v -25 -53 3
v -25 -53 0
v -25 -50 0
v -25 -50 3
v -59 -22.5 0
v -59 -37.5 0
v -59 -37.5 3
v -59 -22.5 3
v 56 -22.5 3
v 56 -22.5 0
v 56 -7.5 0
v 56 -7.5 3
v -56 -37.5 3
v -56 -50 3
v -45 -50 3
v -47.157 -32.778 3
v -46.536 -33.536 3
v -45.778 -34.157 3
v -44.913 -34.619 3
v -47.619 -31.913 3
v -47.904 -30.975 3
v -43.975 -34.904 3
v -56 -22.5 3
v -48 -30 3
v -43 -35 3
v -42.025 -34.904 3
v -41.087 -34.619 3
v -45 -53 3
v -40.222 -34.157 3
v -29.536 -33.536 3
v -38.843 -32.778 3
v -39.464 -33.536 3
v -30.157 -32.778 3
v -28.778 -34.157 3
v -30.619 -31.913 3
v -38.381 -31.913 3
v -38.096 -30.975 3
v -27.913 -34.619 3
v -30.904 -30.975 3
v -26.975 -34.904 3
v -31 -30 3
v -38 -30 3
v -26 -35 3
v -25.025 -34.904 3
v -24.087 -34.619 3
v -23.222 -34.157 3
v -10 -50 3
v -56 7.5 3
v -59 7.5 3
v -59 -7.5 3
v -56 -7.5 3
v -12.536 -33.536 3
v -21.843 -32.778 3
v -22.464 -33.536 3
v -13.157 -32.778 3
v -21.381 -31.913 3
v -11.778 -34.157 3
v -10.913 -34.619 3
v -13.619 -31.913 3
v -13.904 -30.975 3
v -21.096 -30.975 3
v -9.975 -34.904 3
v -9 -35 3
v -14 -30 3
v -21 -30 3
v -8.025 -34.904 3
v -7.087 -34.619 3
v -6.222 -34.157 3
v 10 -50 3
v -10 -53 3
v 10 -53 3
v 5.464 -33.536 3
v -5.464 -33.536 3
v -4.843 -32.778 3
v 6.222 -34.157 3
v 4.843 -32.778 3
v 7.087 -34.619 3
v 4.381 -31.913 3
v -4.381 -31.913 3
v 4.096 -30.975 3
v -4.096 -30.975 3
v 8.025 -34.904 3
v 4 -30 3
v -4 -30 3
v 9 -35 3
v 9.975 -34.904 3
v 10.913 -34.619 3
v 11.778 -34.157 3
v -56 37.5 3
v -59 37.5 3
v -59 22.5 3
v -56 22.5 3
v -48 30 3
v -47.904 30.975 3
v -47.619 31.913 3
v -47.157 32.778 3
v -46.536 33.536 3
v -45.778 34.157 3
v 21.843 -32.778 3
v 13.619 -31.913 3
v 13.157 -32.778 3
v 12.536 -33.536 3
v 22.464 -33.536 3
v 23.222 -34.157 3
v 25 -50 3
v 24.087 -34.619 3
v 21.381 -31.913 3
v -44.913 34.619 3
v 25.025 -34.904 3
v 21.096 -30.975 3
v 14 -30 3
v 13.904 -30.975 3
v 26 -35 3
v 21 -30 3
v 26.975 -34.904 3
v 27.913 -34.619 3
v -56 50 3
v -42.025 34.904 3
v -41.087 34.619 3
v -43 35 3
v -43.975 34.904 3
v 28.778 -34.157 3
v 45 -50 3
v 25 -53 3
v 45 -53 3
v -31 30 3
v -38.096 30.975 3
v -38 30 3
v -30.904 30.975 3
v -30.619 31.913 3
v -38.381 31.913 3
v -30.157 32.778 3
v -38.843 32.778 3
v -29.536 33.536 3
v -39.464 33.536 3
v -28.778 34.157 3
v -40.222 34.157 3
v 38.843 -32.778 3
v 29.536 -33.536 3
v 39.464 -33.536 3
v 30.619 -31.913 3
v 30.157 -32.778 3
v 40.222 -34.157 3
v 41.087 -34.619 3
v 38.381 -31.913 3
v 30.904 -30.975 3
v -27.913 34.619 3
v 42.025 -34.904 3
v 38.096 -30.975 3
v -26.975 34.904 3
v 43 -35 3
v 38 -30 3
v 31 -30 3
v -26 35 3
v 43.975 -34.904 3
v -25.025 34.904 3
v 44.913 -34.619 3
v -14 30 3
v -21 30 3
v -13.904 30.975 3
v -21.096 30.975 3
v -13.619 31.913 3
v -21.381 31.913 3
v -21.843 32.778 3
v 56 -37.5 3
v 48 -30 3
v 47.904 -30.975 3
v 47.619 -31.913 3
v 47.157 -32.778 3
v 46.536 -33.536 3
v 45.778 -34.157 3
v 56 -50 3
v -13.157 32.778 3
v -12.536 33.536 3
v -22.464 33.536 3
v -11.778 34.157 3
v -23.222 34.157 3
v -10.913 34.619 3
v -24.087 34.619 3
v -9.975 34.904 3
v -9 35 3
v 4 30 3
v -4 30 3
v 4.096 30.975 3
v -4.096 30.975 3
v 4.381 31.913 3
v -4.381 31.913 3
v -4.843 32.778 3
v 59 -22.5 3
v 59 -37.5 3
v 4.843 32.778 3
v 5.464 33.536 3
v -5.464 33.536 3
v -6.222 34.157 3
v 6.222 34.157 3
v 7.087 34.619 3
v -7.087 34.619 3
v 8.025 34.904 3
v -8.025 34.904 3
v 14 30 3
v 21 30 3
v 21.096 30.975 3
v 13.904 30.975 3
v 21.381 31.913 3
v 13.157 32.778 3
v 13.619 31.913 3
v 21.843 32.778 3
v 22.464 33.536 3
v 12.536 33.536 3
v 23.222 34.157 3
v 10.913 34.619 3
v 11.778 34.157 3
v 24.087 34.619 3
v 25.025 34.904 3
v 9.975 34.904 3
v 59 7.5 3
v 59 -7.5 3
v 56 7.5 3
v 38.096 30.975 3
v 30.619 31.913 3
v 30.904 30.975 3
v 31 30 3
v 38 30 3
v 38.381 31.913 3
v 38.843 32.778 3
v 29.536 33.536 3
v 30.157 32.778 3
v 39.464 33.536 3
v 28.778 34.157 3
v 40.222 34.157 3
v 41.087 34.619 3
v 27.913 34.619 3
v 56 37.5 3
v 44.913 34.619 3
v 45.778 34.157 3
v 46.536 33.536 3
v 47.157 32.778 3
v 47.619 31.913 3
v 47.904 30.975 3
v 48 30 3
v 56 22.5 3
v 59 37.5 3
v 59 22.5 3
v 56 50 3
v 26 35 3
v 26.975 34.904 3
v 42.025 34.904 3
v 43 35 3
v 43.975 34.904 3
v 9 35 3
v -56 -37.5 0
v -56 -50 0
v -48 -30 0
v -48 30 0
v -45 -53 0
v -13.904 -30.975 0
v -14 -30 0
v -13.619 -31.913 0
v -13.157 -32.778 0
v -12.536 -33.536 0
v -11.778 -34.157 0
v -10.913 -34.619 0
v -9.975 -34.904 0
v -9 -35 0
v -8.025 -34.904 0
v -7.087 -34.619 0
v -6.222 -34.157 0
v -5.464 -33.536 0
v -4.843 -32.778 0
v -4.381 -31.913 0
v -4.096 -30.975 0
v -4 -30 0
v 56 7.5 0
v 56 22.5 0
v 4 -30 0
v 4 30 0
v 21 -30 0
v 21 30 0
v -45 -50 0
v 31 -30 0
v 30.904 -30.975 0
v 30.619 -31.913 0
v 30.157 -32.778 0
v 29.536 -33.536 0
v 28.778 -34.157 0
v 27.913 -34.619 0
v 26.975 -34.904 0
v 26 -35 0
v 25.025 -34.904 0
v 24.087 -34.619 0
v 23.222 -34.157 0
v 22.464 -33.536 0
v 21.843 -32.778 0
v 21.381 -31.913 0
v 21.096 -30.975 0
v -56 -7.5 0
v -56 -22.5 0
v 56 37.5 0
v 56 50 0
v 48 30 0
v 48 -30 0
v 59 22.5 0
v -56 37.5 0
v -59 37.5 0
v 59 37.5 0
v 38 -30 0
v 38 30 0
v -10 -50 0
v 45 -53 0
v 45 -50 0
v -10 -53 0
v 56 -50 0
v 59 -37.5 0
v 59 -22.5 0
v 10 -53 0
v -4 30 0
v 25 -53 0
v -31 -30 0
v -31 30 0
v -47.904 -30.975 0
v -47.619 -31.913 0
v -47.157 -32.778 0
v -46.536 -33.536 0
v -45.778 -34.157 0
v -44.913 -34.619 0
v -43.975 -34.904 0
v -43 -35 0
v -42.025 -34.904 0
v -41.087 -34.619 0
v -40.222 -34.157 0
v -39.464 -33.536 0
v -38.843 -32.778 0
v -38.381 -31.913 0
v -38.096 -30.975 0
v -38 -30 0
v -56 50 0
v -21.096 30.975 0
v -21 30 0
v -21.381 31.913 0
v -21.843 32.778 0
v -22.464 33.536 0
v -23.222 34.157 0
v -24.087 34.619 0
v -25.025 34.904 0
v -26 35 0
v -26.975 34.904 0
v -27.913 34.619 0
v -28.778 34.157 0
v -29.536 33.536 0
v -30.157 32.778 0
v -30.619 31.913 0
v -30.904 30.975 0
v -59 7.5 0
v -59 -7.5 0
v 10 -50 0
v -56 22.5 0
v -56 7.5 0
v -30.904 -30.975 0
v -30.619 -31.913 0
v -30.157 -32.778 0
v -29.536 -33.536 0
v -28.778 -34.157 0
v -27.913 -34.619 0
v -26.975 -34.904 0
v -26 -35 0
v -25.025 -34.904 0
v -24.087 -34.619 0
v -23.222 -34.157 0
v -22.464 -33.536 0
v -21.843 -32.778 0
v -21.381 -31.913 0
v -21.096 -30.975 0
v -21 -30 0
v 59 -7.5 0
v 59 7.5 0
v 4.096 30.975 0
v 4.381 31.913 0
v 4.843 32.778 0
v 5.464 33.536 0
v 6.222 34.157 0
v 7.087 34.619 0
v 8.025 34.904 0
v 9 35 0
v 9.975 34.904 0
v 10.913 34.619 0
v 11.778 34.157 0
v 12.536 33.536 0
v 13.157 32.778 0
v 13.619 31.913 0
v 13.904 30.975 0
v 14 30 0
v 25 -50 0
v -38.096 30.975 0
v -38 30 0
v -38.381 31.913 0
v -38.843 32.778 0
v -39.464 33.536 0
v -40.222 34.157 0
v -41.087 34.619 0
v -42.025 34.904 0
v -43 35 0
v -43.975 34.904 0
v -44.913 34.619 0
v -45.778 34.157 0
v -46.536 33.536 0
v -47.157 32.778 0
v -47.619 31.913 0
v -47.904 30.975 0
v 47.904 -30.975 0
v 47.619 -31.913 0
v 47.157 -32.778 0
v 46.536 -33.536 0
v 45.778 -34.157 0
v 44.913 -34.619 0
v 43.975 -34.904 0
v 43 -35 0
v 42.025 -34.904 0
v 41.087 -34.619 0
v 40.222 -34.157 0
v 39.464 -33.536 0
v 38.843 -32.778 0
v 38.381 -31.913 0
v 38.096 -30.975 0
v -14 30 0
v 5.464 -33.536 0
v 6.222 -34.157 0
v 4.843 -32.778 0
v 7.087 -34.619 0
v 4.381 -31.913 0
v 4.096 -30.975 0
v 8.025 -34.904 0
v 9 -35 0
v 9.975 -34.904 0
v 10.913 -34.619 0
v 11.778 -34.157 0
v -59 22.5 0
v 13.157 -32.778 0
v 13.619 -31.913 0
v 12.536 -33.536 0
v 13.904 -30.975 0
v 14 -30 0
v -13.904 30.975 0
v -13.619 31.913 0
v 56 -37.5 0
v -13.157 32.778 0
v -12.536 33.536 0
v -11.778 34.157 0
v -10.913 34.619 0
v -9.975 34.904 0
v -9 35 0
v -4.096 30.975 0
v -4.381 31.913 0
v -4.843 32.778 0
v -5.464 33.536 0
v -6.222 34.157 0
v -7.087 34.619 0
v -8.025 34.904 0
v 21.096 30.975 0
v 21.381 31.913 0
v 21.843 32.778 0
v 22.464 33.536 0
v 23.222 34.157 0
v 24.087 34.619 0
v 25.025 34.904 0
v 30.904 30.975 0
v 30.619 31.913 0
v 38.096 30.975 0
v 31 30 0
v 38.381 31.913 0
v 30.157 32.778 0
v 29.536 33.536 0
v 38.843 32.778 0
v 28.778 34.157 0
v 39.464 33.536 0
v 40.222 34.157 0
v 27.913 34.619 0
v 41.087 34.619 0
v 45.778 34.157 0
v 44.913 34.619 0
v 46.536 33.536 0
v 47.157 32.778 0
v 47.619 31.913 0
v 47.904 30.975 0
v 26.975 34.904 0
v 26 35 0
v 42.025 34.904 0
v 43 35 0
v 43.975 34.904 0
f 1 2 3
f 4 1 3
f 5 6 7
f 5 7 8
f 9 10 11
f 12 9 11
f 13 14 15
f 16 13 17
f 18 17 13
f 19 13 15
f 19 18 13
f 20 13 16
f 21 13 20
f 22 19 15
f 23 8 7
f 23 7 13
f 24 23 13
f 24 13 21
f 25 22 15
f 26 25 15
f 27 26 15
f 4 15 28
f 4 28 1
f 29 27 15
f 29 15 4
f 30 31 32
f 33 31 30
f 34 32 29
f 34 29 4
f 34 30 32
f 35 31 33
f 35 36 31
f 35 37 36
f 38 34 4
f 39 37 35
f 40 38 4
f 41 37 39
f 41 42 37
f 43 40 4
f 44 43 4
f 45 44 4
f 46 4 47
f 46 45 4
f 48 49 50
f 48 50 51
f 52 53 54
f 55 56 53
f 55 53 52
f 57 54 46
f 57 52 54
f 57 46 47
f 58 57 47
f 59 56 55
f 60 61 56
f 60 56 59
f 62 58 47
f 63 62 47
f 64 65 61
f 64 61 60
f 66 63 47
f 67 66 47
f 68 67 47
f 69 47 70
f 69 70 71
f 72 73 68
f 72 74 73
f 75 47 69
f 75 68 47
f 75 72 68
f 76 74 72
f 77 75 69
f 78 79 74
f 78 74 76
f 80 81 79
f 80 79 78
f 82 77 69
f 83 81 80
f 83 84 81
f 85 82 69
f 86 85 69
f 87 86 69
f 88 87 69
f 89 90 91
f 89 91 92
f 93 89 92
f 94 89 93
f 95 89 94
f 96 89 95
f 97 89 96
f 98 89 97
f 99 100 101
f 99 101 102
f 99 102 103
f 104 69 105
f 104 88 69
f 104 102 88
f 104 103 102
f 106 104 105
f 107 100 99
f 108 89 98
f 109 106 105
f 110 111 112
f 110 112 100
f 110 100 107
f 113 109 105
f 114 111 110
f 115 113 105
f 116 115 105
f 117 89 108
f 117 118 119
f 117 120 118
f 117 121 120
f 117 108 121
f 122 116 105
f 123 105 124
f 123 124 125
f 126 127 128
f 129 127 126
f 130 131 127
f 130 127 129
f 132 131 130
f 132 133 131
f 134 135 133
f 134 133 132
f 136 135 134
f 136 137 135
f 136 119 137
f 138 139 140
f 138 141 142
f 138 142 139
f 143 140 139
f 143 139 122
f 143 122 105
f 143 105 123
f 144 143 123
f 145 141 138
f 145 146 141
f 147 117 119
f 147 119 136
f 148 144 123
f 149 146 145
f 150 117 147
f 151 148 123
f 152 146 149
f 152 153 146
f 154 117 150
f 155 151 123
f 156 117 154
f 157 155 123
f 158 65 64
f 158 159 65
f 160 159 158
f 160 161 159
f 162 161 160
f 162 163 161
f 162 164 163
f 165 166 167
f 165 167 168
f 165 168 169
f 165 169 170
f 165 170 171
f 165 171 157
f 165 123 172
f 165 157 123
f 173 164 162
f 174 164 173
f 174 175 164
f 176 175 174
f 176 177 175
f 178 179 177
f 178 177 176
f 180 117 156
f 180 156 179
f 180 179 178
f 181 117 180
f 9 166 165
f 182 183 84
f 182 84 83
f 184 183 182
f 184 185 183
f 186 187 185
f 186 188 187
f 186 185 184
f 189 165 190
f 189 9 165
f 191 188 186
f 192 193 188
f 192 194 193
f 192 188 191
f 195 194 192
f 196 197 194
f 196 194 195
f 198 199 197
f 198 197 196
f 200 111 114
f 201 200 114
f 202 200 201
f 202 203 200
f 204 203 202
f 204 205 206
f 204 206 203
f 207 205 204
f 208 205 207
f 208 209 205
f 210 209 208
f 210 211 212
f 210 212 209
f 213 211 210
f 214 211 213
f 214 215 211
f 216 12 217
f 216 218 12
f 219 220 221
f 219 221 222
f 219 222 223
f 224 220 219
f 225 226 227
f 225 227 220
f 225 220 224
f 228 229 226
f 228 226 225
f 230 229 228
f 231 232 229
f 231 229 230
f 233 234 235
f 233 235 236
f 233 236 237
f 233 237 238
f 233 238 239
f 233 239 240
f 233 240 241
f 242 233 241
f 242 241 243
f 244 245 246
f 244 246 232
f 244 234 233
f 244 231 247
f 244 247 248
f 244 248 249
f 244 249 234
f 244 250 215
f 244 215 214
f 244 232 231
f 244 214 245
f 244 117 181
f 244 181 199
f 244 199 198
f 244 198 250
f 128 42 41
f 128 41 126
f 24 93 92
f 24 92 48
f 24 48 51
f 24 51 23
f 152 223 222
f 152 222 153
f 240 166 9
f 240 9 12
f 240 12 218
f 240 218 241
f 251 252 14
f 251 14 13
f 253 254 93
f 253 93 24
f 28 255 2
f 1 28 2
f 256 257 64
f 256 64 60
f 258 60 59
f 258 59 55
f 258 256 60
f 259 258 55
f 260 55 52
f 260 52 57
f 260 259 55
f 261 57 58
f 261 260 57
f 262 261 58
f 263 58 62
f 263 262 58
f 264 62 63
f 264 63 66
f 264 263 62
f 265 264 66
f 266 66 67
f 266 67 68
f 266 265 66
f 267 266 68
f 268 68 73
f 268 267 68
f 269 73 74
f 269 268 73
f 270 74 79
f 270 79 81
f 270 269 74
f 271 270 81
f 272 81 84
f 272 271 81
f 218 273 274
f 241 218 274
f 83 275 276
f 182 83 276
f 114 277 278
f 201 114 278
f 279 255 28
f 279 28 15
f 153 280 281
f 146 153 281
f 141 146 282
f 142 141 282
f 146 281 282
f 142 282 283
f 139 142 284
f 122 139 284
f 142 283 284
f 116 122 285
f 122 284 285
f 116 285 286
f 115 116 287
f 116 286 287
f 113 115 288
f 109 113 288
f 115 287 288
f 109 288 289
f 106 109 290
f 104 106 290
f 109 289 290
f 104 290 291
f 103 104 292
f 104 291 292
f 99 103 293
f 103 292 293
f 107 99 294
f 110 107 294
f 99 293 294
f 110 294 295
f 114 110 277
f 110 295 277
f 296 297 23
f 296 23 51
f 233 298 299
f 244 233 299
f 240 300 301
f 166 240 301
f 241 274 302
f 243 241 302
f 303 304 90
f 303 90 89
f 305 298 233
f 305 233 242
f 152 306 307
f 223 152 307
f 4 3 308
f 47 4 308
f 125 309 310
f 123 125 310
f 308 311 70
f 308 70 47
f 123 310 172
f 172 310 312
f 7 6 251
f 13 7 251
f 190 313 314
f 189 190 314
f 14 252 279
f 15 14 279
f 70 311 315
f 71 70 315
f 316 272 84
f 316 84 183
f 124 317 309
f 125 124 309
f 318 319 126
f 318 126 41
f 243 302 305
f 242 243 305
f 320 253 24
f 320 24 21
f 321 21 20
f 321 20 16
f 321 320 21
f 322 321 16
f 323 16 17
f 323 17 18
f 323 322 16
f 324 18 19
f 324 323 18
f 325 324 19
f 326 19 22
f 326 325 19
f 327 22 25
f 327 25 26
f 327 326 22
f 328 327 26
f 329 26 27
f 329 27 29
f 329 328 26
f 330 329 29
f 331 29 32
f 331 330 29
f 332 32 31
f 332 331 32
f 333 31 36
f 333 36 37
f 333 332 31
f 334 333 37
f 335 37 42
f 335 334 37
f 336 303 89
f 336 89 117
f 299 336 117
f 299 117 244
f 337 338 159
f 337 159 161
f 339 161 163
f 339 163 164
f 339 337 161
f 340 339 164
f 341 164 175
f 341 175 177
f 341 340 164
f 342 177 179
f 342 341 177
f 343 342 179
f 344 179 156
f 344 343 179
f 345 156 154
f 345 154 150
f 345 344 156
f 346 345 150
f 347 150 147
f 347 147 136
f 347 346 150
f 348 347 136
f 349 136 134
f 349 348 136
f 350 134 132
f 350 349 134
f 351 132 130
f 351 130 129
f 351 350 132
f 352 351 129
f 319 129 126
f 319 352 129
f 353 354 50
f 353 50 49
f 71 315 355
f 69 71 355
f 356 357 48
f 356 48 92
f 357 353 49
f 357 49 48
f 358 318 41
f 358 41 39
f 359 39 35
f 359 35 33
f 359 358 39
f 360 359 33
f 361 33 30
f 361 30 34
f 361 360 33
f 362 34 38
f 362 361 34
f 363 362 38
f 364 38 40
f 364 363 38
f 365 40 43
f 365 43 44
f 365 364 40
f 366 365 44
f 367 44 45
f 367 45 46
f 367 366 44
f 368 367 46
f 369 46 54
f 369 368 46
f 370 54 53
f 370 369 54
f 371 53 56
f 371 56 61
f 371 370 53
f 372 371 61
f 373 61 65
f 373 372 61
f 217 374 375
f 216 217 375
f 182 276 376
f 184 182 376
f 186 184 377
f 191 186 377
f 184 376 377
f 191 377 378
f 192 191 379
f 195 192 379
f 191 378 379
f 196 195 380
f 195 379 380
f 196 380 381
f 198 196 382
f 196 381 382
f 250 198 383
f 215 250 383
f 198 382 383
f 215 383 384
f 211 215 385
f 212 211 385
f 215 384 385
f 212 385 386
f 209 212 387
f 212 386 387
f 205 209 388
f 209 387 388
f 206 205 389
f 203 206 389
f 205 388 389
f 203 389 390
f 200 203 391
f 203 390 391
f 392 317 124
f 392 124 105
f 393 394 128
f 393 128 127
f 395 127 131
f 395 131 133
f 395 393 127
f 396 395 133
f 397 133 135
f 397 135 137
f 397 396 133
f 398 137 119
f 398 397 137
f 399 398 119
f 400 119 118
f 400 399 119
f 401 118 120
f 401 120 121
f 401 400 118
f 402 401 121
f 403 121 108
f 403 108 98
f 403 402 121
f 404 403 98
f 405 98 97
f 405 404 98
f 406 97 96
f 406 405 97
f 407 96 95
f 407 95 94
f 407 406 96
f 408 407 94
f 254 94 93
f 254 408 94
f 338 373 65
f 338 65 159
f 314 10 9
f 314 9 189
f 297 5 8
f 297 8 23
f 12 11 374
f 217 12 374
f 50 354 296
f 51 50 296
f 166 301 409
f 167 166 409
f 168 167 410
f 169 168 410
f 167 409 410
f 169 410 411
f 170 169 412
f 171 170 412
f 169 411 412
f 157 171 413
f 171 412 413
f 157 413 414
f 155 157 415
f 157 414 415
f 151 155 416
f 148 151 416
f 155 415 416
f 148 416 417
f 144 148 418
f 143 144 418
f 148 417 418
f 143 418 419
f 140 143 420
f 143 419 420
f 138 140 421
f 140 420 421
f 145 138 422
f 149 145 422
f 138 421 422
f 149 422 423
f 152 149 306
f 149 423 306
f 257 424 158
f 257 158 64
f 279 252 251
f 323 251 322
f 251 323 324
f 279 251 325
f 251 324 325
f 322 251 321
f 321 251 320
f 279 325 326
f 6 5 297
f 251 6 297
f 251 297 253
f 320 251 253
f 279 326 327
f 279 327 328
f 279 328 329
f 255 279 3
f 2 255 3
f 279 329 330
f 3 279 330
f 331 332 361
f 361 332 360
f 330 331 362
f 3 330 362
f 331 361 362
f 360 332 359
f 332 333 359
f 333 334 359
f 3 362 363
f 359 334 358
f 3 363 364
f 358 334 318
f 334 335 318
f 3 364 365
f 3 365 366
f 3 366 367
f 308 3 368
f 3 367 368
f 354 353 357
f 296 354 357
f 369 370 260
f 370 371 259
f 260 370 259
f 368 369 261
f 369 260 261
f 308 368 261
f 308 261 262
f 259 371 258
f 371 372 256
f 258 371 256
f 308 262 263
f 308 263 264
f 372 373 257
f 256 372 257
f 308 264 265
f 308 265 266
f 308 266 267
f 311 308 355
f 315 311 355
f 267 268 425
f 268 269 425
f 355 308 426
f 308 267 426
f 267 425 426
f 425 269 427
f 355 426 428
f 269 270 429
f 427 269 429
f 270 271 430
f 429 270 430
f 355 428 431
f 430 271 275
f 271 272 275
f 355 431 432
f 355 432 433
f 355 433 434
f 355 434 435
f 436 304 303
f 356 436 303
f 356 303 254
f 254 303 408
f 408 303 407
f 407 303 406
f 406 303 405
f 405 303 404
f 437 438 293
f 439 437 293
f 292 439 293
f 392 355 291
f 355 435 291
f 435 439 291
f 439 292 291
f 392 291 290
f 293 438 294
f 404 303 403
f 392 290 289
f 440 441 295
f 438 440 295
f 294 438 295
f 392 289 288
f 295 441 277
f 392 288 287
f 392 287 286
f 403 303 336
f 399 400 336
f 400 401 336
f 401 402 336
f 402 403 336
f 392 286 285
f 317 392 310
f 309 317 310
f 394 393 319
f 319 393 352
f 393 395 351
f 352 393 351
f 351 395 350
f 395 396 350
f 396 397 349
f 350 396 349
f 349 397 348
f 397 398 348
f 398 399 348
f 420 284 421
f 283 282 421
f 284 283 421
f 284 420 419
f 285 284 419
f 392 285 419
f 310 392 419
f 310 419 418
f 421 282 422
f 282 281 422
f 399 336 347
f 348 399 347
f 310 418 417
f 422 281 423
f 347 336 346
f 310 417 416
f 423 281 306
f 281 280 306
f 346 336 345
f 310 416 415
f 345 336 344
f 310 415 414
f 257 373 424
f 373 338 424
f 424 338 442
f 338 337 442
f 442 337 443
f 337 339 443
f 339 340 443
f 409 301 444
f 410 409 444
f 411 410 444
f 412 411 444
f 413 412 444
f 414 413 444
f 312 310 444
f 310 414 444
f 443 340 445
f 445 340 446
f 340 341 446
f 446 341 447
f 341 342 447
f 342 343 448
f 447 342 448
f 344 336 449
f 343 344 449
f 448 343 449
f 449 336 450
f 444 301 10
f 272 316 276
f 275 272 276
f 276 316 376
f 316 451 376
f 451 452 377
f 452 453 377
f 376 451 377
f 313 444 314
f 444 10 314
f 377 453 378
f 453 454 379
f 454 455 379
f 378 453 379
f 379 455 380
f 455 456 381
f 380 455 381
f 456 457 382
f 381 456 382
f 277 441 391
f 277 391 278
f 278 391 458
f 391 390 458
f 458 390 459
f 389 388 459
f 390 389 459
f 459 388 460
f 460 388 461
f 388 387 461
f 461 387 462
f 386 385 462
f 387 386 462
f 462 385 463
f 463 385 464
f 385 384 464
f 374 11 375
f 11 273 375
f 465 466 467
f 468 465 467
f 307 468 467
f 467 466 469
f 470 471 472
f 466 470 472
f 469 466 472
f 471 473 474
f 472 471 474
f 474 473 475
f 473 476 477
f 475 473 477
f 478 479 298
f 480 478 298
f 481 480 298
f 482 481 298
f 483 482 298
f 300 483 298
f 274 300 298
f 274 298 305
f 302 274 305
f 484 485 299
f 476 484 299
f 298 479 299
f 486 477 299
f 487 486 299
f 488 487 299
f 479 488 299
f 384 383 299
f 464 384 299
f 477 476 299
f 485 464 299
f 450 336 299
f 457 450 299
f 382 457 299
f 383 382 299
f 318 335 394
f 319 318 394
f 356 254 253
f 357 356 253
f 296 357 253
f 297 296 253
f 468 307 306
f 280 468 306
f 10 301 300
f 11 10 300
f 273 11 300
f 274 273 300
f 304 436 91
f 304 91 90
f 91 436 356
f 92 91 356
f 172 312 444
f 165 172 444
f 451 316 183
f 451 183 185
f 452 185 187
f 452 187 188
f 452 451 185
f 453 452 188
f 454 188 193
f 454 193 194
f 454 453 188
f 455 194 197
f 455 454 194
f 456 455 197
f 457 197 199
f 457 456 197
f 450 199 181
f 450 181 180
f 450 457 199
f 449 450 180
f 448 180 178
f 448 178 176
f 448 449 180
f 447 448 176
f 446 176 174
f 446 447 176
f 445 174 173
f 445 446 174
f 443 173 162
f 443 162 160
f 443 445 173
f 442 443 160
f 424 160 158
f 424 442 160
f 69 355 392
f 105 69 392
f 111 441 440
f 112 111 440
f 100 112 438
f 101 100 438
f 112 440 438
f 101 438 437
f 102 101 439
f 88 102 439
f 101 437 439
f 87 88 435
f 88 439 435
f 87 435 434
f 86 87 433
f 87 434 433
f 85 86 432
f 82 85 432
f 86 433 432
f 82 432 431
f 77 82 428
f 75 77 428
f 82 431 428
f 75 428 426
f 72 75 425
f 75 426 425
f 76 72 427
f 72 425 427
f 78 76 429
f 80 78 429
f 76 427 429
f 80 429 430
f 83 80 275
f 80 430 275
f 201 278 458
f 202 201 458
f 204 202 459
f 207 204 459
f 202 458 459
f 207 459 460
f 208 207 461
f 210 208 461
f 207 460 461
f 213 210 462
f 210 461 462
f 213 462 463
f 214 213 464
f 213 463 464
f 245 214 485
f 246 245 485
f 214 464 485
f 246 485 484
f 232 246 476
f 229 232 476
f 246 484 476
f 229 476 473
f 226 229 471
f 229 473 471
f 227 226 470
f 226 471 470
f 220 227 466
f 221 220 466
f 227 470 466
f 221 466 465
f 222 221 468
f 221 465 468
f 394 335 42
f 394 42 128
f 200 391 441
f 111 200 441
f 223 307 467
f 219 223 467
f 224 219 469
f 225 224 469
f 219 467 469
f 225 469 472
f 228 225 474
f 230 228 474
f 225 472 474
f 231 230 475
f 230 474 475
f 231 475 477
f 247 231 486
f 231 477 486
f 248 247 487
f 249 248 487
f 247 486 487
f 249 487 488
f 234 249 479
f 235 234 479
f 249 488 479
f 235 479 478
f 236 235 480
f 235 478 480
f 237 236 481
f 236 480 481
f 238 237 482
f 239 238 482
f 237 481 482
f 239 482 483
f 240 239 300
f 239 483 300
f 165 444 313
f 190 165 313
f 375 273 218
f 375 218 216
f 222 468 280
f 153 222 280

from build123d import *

# Parameters (mm, degrees)
SKETCH1_W           = 3
SKETCH1_H           = 15
SKETCH1_W_2         = 112
SKETCH1_H_2         = 100
SKETCH1_W_3         = 20
SKETCH1_H_3         = 3
BOSS_EXTRUDE1_DEPTH = 3


with BuildPart() as part:
    # Sketch1 → Boss-Extrude1 (new body)
    # profile 1 of 10: a face of its own
    with BuildSketch(Plane.XY):
        with Locations((-57.5, 30)):
            Rectangle(SKETCH1_W, SKETCH1_H)
    # profile 2 of 10: a face of its own
    with BuildSketch(Plane.XY):
        Rectangle(SKETCH1_W_2, SKETCH1_H_2)
        with BuildLine():
            ThreePointArc((-4, 30), (-9, 35), (-14, 30))
            Line((-14, 30), (-14, -30))
            ThreePointArc((-14, -30), (-9, -35), (-4, -30))
            Line((-4, -30), (-4, 30))
        make_face(mode=Mode.SUBTRACT)
        with BuildLine():
            ThreePointArc((-21, 30), (-26, 35), (-31, 30))
            Line((-31, 30), (-31, -30))
            ThreePointArc((-31, -30), (-26, -35), (-21, -30))
            Line((-21, -30), (-21, 30))
        make_face(mode=Mode.SUBTRACT)
        with BuildLine():
            ThreePointArc((-38, 30), (-43, 35), (-48, 30))
            Line((-48, 30), (-48, -30))
            ThreePointArc((-48, -30), (-43, -35), (-38, -30))
            Line((-38, -30), (-38, 30))
        make_face(mode=Mode.SUBTRACT)
        with BuildLine():
            Line((4, -30), (4, 30))
            ThreePointArc((4, 30), (9, 35), (14, 30))
            Line((14, 30), (14, -30))
            ThreePointArc((14, -30), (9, -35), (4, -30))
        make_face(mode=Mode.SUBTRACT)
        with BuildLine():
            Line((21, -30), (21, 30))
            ThreePointArc((21, 30), (26, 35), (31, 30))
            Line((31, 30), (31, -30))
            ThreePointArc((31, -30), (26, -35), (21, -30))
        make_face(mode=Mode.SUBTRACT)
        with BuildLine():
            Line((38, -30), (38, 30))
            ThreePointArc((38, 30), (43, 35), (48, 30))
            Line((48, 30), (48, -30))
            ThreePointArc((48, -30), (43, -35), (38, -30))
        make_face(mode=Mode.SUBTRACT)
    # profile 3 of 10: a face of its own
    with BuildSketch(Plane.XY):
        with Locations((-57.5, 0)):
            Rectangle(SKETCH1_W, SKETCH1_H)
    # profile 4 of 10: a face of its own
    with BuildSketch(Plane.XY):
        with Locations((-35, -51.5)):
            Rectangle(SKETCH1_W_3, SKETCH1_H_3)
    # profile 5 of 10: a face of its own
    with BuildSketch(Plane.XY):
        with Locations((0, -51.5)):
            Rectangle(SKETCH1_W_3, SKETCH1_H_3)
    # profile 6 of 10: a face of its own
    with BuildSketch(Plane.XY):
        with Locations((35, -51.5)):
            Rectangle(SKETCH1_W_3, SKETCH1_H_3)
    # profile 7 of 10: a face of its own
    with BuildSketch(Plane.XY):
        with Locations((57.5, 0)):
            Rectangle(SKETCH1_W, SKETCH1_H)
    # profile 8 of 10: a face of its own
    with BuildSketch(Plane.XY):
        with Locations((57.5, 30)):
            Rectangle(SKETCH1_W, SKETCH1_H)
    # profile 9 of 10: a face of its own
    with BuildSketch(Plane.XY):
        with Locations((-57.5, -30)):
            Rectangle(SKETCH1_W, SKETCH1_H)
    # profile 10 of 10: a face of its own
    with BuildSketch(Plane.XY):
        with Locations((57.5, -30)):
            Rectangle(SKETCH1_W, SKETCH1_H)
    extrude(amount=BOSS_EXTRUDE1_DEPTH)


solid = part.part
